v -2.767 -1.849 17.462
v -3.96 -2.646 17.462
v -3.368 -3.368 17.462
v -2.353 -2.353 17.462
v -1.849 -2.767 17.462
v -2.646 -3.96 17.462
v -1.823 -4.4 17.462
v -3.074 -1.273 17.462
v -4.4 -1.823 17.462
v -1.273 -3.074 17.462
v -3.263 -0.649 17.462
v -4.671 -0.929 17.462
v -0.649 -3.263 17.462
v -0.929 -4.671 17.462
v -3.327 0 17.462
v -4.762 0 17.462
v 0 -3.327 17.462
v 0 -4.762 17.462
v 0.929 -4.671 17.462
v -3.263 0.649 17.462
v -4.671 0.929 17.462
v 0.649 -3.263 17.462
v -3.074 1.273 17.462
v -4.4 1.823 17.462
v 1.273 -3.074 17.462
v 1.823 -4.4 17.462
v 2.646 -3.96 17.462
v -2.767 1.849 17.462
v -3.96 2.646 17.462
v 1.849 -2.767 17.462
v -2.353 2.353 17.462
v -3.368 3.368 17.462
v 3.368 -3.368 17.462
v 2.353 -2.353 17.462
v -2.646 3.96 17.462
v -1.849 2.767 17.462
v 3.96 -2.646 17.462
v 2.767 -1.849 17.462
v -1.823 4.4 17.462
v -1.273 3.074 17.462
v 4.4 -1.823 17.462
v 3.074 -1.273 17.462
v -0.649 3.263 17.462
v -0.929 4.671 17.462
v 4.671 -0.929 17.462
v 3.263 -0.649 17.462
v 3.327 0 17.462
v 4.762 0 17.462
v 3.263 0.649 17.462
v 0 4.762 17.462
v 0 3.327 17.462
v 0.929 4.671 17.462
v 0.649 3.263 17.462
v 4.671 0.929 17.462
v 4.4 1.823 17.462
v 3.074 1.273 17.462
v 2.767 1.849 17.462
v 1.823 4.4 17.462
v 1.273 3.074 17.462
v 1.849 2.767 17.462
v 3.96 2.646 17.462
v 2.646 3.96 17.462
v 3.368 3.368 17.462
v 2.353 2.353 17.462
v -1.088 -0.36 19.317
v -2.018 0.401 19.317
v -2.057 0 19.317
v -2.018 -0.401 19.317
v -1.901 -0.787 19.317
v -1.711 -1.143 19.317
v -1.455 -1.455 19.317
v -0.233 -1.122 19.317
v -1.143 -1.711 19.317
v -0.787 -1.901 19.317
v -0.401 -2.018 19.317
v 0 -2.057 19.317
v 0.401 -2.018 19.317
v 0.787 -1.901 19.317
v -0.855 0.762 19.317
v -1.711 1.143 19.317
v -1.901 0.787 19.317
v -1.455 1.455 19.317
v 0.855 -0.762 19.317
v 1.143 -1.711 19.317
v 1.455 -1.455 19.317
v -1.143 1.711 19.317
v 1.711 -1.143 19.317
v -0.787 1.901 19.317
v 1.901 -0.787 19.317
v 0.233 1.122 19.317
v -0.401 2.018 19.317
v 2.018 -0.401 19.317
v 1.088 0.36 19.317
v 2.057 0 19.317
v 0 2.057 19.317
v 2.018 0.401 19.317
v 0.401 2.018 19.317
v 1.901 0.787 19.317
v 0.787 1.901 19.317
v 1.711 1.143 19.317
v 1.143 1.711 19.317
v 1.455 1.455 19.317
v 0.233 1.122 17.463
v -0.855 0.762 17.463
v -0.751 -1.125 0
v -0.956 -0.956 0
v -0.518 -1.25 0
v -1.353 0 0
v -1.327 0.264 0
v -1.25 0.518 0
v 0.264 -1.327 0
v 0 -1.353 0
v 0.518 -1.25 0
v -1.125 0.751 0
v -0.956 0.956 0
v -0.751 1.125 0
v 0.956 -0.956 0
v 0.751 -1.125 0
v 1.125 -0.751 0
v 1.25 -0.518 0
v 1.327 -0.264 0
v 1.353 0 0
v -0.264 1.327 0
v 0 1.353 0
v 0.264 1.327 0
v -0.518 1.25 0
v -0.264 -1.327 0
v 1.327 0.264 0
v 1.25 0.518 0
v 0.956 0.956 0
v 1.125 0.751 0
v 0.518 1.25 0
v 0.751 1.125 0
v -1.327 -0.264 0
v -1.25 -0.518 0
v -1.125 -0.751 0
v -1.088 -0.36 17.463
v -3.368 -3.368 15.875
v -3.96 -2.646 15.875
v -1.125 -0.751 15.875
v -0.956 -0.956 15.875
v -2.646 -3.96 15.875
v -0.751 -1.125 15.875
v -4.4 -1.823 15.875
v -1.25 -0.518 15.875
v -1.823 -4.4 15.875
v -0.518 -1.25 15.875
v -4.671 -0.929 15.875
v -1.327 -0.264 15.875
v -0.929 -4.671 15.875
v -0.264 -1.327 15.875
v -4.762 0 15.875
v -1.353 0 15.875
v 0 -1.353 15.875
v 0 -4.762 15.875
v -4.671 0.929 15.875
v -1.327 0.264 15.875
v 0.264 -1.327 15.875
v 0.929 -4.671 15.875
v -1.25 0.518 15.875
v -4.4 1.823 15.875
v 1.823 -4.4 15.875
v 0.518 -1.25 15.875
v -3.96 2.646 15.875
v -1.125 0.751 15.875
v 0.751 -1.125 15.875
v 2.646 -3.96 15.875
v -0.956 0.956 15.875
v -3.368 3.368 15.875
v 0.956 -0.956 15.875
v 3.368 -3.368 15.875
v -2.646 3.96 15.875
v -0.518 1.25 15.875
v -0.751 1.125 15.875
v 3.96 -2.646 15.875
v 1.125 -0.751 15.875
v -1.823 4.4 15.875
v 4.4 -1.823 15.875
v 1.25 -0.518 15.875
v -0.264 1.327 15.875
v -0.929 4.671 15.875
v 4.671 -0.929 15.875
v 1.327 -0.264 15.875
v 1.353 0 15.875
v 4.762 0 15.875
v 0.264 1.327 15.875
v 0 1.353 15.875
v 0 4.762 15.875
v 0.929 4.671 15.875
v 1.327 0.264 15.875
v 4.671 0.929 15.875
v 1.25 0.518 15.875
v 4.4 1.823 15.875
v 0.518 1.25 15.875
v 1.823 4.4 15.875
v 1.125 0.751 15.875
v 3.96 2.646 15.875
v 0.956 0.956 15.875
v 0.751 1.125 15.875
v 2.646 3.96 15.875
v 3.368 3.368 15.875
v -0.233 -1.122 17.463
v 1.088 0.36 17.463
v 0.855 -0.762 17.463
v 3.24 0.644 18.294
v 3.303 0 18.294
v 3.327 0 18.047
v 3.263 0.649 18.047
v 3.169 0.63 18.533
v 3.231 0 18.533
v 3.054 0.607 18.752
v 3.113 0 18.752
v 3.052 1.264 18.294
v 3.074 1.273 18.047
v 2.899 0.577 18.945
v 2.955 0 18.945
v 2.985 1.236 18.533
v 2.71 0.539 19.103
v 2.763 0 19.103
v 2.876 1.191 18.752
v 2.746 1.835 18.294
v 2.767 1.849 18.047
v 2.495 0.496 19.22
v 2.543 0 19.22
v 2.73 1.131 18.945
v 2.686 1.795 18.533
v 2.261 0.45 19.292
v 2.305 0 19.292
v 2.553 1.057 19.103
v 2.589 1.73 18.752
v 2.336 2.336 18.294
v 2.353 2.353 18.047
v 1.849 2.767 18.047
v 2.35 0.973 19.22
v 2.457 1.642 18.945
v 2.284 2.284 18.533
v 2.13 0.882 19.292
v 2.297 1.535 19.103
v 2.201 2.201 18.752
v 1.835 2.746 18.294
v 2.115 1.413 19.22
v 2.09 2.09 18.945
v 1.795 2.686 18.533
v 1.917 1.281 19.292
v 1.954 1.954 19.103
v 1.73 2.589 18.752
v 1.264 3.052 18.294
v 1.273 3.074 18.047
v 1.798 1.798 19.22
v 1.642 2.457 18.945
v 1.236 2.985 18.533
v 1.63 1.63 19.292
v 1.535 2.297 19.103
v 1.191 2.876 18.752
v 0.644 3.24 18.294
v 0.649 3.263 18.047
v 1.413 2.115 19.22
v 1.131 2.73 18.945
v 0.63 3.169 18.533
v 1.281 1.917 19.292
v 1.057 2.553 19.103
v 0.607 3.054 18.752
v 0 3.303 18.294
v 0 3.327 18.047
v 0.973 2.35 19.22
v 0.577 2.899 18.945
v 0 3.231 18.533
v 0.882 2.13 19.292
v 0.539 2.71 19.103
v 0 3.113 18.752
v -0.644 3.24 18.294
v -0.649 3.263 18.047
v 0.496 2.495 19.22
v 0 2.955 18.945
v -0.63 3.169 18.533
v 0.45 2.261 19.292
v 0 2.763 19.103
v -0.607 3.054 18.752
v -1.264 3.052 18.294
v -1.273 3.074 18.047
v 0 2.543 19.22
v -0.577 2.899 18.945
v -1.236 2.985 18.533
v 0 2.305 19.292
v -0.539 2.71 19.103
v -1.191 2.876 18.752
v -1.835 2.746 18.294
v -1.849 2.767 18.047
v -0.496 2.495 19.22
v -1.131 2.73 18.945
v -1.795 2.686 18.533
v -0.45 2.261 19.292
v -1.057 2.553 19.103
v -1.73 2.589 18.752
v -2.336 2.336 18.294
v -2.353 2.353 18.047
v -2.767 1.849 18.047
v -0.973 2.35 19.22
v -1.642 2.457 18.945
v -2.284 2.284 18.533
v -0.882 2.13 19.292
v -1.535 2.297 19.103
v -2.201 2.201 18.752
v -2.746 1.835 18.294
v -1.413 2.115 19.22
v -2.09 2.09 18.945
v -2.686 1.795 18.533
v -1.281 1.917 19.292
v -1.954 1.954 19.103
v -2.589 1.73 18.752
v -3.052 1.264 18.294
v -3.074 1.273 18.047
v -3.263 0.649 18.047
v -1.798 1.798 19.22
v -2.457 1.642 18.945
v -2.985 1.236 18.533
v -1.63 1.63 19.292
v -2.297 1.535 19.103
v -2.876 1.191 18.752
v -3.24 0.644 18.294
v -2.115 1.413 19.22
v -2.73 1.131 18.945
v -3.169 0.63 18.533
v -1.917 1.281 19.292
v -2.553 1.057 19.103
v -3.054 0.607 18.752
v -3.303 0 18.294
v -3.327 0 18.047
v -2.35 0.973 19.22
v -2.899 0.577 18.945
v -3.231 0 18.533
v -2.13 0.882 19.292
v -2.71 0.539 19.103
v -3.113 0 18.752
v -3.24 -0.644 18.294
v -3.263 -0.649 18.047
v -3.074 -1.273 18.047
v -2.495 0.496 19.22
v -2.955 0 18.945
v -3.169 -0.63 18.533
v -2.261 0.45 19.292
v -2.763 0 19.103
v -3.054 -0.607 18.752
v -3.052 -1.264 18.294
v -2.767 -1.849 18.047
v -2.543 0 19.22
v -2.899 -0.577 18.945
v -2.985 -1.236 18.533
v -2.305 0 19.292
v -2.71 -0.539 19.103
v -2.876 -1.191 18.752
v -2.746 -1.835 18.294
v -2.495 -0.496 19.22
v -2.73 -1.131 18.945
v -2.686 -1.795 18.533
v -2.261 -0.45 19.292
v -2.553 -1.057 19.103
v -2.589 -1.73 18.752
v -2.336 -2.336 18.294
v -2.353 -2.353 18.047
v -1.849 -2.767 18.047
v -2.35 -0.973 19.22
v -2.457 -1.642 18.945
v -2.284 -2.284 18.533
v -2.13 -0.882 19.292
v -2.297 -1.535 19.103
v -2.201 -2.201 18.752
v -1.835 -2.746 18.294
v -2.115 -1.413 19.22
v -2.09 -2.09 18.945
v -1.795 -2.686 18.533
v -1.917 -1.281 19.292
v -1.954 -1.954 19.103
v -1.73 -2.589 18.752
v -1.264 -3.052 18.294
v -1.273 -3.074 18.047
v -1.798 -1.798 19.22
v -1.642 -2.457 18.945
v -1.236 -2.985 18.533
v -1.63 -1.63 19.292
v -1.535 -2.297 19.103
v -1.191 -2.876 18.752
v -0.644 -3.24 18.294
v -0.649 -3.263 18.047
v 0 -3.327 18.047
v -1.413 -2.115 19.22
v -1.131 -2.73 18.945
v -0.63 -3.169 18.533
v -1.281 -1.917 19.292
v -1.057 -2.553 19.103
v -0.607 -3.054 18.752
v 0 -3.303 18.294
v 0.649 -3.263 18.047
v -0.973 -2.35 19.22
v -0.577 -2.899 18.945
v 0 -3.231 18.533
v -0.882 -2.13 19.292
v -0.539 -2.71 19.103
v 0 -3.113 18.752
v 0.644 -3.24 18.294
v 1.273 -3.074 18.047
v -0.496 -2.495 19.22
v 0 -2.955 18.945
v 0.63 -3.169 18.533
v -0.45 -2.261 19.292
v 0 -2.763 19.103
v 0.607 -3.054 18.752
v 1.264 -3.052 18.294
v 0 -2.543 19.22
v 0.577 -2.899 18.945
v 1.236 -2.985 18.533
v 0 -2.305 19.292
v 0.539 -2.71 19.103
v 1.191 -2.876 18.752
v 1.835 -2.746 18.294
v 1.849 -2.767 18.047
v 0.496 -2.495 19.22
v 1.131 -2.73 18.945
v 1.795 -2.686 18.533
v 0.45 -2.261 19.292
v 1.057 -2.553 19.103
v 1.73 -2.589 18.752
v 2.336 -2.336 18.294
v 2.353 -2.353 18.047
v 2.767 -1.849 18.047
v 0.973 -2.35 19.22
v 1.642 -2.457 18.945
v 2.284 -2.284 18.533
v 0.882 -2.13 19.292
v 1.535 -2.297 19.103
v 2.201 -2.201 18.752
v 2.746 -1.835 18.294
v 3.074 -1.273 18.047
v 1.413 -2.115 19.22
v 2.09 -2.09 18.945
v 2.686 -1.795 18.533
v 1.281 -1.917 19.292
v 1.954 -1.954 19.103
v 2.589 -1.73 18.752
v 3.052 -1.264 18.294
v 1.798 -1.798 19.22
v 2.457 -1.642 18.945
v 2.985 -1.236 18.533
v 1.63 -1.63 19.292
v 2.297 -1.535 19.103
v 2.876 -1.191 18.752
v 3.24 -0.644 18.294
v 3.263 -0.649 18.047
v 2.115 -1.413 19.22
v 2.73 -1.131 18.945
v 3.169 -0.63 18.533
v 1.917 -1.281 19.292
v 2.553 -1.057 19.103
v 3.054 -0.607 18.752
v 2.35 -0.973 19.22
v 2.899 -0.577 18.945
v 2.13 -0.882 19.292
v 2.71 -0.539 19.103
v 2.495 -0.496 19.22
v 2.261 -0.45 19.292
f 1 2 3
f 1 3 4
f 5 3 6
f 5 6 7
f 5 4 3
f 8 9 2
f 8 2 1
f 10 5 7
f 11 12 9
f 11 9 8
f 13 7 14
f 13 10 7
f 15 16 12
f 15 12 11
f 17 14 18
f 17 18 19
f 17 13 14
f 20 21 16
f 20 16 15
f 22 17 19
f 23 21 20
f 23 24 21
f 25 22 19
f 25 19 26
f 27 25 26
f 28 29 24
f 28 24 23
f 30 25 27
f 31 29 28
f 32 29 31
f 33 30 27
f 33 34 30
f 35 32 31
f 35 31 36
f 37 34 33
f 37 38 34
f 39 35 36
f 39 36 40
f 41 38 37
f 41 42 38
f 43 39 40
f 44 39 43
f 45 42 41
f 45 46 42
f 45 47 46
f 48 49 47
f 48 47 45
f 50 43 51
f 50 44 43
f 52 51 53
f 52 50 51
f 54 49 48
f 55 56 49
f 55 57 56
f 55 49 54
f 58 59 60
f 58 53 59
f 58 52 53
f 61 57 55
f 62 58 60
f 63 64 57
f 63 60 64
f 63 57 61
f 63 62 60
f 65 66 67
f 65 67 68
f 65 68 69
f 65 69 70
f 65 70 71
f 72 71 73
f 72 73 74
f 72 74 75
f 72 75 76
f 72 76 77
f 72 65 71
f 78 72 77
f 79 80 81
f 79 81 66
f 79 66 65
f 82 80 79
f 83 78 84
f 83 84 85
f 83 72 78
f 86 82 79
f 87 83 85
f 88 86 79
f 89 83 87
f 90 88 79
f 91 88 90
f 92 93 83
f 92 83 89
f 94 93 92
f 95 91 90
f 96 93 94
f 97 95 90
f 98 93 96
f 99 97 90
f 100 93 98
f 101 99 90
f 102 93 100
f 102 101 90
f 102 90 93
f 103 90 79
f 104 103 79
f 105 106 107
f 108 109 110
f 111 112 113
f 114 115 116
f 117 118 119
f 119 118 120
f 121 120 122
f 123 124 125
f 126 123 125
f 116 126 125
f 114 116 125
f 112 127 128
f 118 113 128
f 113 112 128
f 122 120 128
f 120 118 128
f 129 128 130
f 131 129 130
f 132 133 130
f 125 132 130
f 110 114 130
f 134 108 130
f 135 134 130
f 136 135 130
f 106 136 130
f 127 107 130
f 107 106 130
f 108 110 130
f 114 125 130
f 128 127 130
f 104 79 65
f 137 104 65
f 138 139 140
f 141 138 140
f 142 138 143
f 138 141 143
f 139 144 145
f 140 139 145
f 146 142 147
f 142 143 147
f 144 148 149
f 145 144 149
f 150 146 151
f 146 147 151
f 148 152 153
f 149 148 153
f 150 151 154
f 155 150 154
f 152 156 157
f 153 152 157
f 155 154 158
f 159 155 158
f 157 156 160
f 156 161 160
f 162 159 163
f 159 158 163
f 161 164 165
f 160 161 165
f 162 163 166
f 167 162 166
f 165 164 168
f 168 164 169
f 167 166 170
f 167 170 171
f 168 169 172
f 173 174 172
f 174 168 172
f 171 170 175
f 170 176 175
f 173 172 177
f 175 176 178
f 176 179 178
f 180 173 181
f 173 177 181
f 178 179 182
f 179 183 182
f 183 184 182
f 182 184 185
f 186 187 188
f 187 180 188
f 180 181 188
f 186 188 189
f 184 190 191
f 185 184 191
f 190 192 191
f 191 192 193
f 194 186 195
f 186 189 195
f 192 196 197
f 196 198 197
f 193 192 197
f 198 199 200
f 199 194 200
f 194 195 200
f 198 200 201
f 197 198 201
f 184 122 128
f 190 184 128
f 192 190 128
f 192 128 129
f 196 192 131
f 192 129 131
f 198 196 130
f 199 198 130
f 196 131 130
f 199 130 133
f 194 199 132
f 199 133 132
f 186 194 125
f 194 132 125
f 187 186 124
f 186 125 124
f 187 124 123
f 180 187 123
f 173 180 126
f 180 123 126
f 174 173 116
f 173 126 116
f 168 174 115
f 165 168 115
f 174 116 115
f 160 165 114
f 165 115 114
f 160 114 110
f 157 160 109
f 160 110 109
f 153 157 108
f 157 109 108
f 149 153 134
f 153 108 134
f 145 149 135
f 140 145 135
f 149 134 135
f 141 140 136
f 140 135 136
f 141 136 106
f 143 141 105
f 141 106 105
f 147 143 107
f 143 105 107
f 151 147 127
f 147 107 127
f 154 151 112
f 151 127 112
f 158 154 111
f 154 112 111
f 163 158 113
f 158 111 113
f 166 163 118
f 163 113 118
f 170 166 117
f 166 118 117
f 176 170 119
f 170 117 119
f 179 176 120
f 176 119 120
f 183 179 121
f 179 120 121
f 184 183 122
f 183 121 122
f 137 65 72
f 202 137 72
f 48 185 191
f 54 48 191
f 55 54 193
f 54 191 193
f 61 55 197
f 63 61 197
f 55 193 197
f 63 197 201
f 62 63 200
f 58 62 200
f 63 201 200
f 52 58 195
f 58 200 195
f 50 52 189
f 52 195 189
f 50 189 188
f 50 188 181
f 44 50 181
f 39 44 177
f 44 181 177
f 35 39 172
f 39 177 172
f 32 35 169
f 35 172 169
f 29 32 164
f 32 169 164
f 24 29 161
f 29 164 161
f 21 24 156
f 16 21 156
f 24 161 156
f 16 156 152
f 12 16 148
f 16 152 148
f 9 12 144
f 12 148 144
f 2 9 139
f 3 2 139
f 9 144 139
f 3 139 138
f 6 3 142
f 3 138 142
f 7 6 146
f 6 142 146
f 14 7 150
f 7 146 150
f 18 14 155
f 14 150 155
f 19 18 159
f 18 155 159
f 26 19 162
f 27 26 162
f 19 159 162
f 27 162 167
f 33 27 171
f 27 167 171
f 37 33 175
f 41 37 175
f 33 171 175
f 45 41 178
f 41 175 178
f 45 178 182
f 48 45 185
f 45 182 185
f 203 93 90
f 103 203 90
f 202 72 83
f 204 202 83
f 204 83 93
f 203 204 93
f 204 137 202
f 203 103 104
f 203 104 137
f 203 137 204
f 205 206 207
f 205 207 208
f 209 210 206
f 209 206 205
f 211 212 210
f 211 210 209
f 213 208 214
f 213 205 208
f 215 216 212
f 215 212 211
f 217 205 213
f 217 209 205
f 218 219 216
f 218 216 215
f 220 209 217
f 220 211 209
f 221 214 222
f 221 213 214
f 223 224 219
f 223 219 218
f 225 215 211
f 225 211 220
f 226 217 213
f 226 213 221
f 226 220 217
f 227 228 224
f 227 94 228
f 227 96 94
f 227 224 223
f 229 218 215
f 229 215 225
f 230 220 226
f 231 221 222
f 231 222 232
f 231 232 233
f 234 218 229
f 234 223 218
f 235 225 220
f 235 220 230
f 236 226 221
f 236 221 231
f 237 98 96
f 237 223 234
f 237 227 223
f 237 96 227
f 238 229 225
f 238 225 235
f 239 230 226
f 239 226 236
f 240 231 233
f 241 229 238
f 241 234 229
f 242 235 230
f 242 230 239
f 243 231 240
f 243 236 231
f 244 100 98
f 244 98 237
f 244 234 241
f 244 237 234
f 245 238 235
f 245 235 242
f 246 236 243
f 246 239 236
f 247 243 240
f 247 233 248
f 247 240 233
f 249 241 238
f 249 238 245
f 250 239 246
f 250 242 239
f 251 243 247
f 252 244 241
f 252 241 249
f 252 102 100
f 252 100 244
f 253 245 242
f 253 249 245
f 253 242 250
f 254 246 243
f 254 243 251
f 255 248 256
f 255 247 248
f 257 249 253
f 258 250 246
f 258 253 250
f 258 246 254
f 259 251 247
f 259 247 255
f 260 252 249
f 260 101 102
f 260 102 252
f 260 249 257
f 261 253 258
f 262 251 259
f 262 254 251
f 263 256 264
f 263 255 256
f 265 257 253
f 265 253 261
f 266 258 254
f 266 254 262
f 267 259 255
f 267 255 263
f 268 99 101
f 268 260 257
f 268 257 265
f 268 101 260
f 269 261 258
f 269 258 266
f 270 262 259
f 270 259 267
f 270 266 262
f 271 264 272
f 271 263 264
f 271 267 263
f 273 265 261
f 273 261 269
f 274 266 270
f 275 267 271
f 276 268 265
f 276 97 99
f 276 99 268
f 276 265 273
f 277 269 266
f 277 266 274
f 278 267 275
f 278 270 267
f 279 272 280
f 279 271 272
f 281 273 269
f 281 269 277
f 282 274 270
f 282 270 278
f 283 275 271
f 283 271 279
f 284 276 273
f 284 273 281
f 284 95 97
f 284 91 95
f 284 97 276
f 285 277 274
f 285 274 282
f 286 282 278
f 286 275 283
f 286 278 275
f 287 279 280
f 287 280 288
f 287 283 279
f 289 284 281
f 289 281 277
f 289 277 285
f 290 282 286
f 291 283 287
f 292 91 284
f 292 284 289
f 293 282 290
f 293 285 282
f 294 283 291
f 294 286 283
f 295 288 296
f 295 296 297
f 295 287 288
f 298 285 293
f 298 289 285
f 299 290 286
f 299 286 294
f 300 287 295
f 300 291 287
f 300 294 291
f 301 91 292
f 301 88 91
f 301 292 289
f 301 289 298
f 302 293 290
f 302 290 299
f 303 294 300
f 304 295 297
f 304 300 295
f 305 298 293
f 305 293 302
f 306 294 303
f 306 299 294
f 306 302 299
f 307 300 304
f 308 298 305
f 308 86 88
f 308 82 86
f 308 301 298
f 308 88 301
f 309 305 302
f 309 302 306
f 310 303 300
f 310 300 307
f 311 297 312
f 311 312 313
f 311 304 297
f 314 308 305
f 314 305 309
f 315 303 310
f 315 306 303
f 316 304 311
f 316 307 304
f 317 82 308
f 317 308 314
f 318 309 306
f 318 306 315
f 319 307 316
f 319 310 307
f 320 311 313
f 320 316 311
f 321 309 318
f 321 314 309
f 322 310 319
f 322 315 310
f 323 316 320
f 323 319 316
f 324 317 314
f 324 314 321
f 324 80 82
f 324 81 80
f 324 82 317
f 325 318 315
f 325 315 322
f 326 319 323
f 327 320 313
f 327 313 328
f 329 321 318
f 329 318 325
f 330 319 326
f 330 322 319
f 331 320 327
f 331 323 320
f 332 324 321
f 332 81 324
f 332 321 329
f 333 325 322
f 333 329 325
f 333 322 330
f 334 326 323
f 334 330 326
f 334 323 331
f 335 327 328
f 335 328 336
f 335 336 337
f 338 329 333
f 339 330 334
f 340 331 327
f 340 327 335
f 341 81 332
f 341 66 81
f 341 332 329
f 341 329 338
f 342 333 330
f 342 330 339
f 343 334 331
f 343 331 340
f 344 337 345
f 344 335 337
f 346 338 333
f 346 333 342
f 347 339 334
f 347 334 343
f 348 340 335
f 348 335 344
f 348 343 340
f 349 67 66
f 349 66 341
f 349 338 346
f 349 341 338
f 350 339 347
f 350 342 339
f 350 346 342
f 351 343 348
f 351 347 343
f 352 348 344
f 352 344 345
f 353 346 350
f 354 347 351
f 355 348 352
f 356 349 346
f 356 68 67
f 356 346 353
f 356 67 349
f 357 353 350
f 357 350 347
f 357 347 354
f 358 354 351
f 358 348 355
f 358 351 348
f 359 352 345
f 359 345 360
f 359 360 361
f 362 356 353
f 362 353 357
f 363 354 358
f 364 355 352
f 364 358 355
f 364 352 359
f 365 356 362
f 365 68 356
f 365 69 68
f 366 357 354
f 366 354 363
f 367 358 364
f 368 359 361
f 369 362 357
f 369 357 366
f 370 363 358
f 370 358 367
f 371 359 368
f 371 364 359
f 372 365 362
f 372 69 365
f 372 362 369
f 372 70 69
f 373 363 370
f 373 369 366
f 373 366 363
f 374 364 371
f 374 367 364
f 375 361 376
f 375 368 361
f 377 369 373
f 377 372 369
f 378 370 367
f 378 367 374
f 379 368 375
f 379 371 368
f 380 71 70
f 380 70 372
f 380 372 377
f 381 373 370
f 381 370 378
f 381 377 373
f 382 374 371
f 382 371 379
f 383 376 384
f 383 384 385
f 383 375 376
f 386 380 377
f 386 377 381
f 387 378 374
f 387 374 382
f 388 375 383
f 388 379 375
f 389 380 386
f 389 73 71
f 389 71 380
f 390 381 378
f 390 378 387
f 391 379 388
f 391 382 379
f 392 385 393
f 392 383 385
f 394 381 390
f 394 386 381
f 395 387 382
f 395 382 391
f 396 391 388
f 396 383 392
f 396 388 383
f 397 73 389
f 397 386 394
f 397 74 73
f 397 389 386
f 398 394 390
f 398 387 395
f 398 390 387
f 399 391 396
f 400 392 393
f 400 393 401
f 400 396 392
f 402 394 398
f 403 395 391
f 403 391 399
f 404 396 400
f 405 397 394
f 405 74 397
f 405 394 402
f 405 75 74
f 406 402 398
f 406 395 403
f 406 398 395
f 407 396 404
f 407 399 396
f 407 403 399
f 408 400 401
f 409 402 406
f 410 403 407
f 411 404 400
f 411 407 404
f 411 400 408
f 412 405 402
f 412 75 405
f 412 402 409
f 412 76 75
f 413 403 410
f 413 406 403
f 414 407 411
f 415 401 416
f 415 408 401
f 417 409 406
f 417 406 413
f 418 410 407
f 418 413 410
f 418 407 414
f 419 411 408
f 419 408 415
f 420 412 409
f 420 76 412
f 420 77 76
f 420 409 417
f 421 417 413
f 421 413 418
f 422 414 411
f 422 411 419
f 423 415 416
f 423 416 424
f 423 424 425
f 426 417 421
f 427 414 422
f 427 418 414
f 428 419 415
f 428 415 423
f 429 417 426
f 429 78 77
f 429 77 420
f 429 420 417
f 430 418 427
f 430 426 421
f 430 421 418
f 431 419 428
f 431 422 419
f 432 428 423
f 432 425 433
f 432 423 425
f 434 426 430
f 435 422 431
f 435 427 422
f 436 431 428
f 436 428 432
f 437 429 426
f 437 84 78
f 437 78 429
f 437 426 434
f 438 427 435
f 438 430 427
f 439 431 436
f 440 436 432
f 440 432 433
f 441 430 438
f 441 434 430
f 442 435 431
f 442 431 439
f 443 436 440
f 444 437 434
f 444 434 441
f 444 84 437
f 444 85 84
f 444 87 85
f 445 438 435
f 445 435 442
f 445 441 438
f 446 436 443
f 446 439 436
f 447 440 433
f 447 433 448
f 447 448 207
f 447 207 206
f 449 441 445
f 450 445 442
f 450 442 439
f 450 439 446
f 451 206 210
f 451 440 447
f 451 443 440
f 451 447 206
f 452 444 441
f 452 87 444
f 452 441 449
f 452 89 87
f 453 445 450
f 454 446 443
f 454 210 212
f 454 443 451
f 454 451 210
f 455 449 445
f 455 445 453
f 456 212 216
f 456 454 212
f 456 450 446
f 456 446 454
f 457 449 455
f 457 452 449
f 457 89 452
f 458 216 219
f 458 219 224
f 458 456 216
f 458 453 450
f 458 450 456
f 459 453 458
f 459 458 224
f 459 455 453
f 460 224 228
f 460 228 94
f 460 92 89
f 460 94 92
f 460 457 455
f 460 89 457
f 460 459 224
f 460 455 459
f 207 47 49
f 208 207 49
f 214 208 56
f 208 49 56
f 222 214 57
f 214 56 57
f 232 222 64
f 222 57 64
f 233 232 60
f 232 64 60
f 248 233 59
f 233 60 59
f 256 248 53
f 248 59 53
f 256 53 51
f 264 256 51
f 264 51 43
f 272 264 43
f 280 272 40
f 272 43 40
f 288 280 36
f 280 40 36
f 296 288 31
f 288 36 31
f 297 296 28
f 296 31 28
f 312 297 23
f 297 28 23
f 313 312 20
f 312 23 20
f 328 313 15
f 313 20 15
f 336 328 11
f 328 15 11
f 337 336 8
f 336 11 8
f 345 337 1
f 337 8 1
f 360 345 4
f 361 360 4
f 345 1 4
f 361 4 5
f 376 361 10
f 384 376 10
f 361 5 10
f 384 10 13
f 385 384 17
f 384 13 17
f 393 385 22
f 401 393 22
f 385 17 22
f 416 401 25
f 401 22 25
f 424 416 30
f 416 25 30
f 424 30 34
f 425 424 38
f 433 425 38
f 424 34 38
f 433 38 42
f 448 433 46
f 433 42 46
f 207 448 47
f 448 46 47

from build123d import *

# Parameters (mm, degrees)
SKETCH1_R           = 1.35255
BOSS_EXTRUDE1_DEPTH = 15.875
SKETCH2_R           = 4.7625
BOSS_EXTRUDE2_DEPTH = 1.5875
SKETCH3_R           = 3.3274
BOSS_EXTRUDE3_DEPTH = 1.8542
FILLET1_R           = 1.27
CUT_EXTRUDE1_DEPTH  = 1.8542


with BuildPart() as part:
    # Sketch1 → Boss-Extrude1 (new body)
    with BuildSketch(Plane.XY):
        Circle(SKETCH1_R)
    extrude(amount=BOSS_EXTRUDE1_DEPTH)

    # Sketch2 → Boss-Extrude2 (add)
    with BuildSketch(Plane.XY.offset(15.875)):
        Circle(SKETCH2_R)
    extrude(amount=BOSS_EXTRUDE2_DEPTH)

    # Sketch3 → Boss-Extrude3 (add)
    with BuildSketch(Plane.XY.offset(17.4625)):
        Circle(SKETCH3_R)
    extrude(amount=BOSS_EXTRUDE3_DEPTH)

    # Fillet1
    fillet1_edges = [part.edges().sort_by_distance(p)[0] for p in [
        (-3.3274, 0, 19.3167),
    ]]
    fillet(fillet1_edges, radius=FILLET1_R)

    # Sketch4 → Cut-Extrude1 (cut)
    with BuildSketch(Plane.XY.offset(19.3167)):
        Polygon((1.087800583, 0.359543143), (0.232526796, 1.121834511), (-0.855273787, 0.762291368), (-1.087800583, -0.359543143), (-0.232526796, -1.121834511), (0.855273787, -0.762291368), align=None)
    extrude(amount=-CUT_EXTRUDE1_DEPTH, mode=Mode.SUBTRACT)


solid = part.part
